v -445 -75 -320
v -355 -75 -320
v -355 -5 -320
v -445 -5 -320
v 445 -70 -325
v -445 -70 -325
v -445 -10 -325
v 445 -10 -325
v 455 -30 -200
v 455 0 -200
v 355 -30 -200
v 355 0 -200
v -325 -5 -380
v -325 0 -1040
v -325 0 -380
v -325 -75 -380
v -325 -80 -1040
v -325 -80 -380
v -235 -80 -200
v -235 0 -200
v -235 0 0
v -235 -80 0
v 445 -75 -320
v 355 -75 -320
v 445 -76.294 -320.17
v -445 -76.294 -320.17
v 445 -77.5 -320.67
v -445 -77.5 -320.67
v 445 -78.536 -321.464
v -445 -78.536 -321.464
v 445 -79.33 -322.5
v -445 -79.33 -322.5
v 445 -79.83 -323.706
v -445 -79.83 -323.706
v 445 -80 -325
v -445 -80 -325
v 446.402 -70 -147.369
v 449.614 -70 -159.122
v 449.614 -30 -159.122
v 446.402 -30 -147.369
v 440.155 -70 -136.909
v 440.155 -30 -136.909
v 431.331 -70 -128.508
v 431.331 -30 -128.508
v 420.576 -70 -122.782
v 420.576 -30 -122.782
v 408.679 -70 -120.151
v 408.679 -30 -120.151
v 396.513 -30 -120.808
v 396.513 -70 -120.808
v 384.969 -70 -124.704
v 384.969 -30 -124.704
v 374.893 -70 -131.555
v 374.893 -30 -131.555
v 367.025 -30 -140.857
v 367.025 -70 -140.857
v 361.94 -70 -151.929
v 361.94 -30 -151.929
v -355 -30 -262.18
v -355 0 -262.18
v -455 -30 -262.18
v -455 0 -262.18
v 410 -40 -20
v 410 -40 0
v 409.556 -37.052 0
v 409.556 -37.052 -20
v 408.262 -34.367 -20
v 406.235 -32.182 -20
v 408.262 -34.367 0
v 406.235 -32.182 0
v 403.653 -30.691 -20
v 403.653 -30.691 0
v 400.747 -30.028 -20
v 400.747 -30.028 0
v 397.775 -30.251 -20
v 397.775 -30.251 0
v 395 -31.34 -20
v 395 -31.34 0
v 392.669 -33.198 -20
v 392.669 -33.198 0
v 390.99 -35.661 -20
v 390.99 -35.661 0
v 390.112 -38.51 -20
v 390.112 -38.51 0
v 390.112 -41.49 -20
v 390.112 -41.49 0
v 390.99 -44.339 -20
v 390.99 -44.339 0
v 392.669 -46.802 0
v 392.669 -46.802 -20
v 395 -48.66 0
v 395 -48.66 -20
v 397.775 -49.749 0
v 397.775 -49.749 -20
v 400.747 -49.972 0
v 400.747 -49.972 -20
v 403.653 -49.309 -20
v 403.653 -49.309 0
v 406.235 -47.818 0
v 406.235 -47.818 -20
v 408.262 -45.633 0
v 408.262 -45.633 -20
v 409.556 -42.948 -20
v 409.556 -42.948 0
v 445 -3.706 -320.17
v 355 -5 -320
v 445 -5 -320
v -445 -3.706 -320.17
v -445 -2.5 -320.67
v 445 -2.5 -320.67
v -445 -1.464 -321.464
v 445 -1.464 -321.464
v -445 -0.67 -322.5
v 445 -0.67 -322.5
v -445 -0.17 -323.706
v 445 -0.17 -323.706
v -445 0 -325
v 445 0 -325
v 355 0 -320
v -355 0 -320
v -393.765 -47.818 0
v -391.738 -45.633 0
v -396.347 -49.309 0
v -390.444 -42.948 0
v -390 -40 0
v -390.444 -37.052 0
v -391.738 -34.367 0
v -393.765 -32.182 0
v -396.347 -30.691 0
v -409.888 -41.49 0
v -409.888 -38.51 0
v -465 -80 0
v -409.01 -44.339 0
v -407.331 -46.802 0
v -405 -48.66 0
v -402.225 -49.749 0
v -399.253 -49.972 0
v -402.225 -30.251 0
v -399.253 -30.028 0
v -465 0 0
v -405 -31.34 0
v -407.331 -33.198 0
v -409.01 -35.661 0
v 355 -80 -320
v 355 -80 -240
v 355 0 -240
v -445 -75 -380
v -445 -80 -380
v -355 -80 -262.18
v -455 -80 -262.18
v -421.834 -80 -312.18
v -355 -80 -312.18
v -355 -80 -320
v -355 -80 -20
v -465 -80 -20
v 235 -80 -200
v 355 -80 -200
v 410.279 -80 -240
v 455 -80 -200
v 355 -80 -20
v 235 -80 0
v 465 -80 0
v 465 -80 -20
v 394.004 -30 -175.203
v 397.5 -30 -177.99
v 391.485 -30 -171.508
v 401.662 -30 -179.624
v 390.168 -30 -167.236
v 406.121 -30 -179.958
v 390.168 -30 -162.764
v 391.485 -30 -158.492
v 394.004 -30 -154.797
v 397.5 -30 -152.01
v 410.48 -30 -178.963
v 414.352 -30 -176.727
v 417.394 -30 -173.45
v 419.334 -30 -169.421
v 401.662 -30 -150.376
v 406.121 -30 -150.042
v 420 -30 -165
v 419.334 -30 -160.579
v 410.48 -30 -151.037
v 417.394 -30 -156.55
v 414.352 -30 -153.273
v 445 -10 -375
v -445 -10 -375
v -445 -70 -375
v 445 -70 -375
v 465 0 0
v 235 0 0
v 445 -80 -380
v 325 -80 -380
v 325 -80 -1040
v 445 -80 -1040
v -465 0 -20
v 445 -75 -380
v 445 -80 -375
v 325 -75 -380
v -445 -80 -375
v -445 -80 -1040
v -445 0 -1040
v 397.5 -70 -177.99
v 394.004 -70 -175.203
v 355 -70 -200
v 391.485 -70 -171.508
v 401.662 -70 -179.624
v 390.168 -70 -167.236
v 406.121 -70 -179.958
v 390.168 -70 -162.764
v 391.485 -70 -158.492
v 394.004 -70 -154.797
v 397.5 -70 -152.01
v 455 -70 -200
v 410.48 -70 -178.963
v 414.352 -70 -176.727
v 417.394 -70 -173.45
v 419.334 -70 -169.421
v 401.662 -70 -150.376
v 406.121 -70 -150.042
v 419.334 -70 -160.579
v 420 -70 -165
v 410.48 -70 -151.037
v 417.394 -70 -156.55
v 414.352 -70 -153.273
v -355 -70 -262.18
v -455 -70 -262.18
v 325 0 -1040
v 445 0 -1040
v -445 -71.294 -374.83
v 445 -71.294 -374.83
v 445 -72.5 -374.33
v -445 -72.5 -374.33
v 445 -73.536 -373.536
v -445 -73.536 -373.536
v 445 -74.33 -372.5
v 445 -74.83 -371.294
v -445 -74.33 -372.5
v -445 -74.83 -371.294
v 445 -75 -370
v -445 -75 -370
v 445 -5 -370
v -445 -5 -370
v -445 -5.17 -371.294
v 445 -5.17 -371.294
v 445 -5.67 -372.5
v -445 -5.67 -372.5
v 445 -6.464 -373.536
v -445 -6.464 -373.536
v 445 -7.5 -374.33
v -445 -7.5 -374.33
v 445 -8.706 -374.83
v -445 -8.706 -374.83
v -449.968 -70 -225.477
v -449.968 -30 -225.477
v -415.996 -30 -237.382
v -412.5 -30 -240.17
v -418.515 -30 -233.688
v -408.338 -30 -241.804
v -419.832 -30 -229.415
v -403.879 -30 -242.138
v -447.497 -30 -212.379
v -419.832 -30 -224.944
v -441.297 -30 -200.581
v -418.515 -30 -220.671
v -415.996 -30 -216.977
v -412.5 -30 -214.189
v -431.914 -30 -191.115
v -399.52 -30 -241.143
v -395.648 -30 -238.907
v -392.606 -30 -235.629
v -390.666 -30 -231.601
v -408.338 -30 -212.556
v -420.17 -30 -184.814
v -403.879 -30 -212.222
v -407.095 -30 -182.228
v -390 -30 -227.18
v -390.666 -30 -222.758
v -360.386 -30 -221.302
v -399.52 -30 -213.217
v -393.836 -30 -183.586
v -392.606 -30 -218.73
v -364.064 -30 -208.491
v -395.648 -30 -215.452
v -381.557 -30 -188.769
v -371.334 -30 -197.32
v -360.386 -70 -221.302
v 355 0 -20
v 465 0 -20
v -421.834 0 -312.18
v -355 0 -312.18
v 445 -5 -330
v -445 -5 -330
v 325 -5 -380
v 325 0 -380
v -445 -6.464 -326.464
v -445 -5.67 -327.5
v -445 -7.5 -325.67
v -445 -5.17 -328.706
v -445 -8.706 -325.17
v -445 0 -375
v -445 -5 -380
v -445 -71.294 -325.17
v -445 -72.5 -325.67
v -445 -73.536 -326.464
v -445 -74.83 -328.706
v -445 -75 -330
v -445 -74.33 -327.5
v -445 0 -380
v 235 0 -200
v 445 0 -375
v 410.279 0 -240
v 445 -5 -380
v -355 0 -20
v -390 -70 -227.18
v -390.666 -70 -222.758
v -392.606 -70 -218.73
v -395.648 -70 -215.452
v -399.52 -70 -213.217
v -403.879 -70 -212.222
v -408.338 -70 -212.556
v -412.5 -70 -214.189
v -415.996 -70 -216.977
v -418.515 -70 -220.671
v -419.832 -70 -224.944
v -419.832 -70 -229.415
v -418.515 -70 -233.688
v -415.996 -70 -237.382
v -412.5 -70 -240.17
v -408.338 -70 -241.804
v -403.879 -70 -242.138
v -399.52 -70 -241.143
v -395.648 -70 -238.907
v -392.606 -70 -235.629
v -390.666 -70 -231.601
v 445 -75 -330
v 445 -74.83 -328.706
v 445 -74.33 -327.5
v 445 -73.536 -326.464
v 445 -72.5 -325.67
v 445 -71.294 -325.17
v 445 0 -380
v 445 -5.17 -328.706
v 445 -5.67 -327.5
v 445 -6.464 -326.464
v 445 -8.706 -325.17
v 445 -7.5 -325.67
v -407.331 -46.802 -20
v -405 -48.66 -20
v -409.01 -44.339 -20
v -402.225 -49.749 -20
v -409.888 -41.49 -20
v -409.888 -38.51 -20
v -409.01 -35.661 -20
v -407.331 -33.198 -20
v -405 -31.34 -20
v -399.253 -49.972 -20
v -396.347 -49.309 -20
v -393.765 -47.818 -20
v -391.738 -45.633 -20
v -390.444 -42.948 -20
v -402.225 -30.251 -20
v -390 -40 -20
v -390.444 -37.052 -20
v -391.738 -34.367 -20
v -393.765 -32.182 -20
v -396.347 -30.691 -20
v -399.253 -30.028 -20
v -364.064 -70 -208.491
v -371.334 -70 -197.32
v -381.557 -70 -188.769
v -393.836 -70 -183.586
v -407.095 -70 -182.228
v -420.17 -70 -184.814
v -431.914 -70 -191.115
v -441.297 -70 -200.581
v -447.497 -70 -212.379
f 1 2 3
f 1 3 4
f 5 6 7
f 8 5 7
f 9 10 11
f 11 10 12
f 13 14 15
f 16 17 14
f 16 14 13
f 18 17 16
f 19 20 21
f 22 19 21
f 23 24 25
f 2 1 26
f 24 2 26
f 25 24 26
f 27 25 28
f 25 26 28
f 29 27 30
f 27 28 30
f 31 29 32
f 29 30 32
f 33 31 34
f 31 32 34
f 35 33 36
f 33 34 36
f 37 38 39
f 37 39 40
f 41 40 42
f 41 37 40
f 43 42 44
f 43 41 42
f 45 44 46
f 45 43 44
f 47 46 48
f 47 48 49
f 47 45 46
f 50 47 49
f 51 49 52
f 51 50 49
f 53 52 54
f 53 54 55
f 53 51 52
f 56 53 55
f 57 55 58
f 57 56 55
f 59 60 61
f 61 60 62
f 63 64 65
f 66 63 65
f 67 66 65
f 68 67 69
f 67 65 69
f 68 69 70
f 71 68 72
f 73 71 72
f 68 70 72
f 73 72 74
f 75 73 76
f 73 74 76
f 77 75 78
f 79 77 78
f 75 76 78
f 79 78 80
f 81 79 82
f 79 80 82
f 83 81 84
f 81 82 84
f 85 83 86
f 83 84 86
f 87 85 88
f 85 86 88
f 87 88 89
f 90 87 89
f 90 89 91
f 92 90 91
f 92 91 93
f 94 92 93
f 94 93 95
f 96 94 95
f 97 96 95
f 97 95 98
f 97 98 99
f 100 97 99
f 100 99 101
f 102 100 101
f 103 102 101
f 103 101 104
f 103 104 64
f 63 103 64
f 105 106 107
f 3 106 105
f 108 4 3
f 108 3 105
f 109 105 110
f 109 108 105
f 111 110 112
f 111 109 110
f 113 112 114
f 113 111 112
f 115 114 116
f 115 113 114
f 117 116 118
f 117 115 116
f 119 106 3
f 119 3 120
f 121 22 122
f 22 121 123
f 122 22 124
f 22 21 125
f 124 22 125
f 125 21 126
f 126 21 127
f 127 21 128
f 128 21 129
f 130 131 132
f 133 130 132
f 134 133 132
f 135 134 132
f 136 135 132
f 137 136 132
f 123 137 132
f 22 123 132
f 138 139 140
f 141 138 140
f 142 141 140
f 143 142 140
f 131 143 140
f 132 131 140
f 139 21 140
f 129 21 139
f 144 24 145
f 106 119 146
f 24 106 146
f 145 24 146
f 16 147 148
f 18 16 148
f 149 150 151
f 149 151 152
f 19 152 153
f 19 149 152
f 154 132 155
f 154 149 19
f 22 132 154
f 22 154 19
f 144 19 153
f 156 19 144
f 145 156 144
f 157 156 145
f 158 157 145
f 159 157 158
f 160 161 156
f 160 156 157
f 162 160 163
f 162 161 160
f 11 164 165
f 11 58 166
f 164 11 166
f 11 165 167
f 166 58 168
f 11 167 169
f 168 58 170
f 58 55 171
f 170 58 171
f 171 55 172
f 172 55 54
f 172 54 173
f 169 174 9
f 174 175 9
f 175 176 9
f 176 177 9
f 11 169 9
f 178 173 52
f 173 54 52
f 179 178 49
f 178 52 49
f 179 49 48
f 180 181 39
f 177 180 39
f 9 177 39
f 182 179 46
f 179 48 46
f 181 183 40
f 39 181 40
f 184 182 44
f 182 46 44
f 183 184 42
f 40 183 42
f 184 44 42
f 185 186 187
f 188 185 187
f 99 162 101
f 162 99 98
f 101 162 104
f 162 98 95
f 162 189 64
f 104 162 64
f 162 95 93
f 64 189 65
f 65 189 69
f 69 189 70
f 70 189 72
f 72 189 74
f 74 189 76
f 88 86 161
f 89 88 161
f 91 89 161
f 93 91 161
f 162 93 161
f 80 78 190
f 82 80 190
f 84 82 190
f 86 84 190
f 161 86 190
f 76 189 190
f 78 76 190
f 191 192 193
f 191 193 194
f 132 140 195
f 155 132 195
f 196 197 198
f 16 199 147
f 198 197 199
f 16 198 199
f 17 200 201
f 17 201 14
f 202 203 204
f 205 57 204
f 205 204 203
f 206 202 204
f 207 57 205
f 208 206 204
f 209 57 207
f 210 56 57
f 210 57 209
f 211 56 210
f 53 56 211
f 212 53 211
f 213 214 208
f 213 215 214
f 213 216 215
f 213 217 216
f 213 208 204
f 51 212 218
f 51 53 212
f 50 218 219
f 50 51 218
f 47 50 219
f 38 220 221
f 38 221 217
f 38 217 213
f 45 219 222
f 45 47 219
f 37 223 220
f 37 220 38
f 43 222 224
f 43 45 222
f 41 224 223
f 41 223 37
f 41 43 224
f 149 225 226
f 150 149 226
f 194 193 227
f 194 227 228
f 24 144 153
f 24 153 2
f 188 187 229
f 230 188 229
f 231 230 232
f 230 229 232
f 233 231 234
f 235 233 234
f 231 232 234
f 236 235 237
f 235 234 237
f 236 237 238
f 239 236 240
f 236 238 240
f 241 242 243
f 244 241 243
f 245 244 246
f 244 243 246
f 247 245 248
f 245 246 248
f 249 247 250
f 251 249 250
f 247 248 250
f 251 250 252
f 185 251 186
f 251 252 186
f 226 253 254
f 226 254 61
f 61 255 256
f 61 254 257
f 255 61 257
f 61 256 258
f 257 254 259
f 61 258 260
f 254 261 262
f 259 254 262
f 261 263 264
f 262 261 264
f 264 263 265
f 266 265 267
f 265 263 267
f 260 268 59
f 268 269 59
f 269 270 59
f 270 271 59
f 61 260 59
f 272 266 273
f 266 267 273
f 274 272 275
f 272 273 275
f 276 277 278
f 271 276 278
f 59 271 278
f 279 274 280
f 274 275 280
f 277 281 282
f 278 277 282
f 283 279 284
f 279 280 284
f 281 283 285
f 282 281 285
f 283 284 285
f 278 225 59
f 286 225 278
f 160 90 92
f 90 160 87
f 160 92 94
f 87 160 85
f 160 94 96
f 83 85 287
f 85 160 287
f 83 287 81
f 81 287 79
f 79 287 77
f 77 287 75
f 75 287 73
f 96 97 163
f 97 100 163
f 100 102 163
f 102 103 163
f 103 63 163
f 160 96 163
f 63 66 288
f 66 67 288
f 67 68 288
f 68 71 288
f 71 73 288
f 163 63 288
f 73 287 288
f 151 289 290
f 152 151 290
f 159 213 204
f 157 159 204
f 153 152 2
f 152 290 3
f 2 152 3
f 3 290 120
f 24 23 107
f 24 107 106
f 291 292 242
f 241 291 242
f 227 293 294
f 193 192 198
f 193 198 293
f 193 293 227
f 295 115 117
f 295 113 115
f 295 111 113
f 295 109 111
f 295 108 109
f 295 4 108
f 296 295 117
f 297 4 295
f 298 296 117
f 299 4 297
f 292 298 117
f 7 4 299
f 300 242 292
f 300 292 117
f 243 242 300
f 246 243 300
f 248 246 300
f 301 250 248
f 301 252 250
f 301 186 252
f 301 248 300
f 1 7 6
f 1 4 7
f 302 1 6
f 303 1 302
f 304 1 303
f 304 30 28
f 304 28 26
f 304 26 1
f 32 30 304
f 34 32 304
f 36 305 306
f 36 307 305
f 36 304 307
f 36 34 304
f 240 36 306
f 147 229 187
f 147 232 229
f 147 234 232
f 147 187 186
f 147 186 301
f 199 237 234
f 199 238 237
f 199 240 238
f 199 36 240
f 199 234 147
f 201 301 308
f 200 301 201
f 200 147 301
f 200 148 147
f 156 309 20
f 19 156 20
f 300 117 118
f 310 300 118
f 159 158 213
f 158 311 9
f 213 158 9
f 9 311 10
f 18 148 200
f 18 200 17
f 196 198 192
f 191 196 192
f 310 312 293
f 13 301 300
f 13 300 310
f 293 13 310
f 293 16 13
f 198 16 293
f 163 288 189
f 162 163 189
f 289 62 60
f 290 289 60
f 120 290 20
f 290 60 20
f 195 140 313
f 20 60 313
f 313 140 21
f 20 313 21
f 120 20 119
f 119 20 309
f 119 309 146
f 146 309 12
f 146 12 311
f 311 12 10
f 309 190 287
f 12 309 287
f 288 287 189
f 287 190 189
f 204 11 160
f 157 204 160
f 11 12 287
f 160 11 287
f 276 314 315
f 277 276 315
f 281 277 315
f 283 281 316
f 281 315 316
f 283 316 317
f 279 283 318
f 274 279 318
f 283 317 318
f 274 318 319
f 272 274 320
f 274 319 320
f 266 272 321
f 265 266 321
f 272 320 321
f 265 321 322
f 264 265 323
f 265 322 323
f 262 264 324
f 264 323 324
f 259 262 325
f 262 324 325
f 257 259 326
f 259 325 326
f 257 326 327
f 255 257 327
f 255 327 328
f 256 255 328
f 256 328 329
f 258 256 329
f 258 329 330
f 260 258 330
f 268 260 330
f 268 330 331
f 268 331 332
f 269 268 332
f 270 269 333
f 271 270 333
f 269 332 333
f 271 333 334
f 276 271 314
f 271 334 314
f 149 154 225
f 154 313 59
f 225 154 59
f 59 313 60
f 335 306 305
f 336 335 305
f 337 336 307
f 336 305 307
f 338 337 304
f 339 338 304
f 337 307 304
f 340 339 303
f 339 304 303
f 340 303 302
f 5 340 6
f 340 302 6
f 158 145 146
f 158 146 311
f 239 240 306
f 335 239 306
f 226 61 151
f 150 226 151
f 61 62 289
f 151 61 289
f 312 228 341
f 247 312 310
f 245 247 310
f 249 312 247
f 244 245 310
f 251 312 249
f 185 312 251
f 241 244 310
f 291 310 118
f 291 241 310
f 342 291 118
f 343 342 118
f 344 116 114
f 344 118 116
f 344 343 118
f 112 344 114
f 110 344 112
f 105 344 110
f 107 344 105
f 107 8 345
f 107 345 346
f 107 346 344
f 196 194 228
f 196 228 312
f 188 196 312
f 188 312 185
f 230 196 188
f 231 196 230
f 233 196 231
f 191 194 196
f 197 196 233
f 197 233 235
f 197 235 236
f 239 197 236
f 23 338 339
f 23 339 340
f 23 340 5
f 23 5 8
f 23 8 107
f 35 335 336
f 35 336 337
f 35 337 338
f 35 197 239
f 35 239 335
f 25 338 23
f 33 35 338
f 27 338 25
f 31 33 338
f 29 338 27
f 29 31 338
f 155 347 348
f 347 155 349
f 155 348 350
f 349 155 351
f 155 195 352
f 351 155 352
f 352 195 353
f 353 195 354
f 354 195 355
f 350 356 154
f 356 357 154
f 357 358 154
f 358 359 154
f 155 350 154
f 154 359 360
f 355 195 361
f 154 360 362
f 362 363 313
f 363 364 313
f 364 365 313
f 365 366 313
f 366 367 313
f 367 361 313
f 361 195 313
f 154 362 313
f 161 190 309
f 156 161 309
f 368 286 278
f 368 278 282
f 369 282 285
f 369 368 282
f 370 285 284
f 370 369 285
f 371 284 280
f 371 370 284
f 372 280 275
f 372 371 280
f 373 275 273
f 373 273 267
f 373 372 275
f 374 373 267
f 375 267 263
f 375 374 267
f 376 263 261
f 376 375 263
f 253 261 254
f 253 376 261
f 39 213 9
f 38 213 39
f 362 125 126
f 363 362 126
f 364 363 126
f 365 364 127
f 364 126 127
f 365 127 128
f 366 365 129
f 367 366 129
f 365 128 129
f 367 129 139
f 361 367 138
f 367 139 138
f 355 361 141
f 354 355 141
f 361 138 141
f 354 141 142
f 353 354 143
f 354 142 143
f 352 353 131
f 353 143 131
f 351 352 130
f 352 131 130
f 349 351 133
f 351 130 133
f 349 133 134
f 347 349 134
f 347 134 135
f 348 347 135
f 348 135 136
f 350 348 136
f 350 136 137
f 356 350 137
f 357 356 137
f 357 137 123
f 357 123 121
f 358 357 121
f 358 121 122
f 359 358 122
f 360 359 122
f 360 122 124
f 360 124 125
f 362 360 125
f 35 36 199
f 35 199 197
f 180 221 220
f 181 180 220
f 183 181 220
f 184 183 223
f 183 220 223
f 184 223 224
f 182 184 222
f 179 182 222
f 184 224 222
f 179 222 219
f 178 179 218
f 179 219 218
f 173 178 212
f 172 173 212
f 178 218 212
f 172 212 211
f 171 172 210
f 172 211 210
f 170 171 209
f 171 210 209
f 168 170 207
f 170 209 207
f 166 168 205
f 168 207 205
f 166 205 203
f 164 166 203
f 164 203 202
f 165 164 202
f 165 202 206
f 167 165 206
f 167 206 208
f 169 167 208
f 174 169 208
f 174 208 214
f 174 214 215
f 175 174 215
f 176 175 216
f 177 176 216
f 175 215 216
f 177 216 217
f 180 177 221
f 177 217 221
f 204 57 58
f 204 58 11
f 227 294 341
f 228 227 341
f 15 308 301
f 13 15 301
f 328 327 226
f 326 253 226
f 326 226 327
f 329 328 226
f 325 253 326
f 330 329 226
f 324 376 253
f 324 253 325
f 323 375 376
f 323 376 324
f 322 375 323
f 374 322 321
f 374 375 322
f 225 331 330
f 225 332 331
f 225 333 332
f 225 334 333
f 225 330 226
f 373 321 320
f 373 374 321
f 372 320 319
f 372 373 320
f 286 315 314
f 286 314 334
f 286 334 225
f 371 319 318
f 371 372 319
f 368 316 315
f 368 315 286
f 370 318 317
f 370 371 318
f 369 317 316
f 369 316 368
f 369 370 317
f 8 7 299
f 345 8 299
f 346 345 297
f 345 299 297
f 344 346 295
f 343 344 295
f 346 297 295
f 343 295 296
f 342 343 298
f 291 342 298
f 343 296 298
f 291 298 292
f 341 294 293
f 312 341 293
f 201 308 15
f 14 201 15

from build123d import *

# Parameters (mm, degrees)
F0_W      = 470
F0_H      = 400
F0_W_2    = 60
F0_H_2    = 20
F1_DEPTH  = 80
F2_W      = 989.0920937061
F2_H      = 720
F3_DEPTH  = 80
F4_R      = 10
F5_DEPTH  = 25
F7_START  = -10
F6_R      = 15
F7_DEPTH  = 40
F10_DEPTH = 80
F12_DEPTH = 890
F13_R     = 5
F15_DEPTH = 1000
F17_DEPTH = 890


with BuildPart() as f1:
    # F0 (on Front) → F1 (new body)
    with BuildSketch(Plane.XZ):
        Polygon((-235, 0), (-355, 0), (-465, 0), (-465, -20), (-355, -20), (-355, -262.1796250343), (-455, -262.1796250343), (-421.8337520964, -312.1796250343), (-355, -312.1796250343), (-355, -1020), (-355, -1040), (-235, -1040), (-235, -840), (235, -840), (235, -1040), (355, -1040), (355, -1020), (355, -240), (410.27864045, -240), (455, -200), (355, -200), (355, -20), (465, -20), (465, 0), (355, 0), (235, 0), (235, -200), (-235, -200), align=None)
        with Locations((0, -520)):
            Rectangle(F0_W, F0_H, mode=Mode.SUBTRACT)
        with Locations((-385, -1030)):
            Rectangle(F0_W_2, F0_H_2)
        with Locations((385, -1030)):
            Rectangle(F0_W_2, F0_H_2)
    extrude(amount=F1_DEPTH)

    # F2 (on face) → F3 (cut)
    with BuildSketch(Plane.XZ.offset(80)):
        with Locations((42.8487956524, -680)):
            Rectangle(F2_W, F2_H)
    extrude(amount=-F3_DEPTH, mode=Mode.SUBTRACT)

    # F4 (on face) → F5 (cut)
    with BuildSketch(Plane.XY):
        with Locations((-400, -40)):
            Circle(F4_R)
        with Locations((400, -40)):
            Circle(F4_R)
    extrude(amount=-F5_DEPTH, mode=Mode.SUBTRACT)

    # F6 (on face) → F7 (join)
    with BuildSketch(Plane.XZ.offset(80).offset(F7_START)):
        with BuildLine():
            Line((-355, -262.1796250343), (-360.3855265494, -221.3018058192))
            ThreePointArc((-360.3855265494, -221.3018058192), (-407.0948116692, -182.2284096551), (-449.9677594515, -225.4765073318))
            Line((-449.9677594515, -225.4765073318), (-455, -262.1796250343))
            Line((-455, -262.1796250343), (-355, -262.1796250343))
        make_face()
        with Locations((-405, -227.1796250343)):
            Circle(F6_R, mode=Mode.SUBTRACT)
        with BuildLine():
            Line((355, -200), (455, -200))
            Line((455, -200), (449.6144734506, -159.1221807849))
            ThreePointArc((449.6144734506, -159.1221807849), (408.6794577223, -120.1506790367), (361.9400684353, -151.9293346135))
            Line((361.9400684353, -151.9293346135), (355, -200))
        make_face()
        with Locations((405, -165)):
            Circle(F6_R, mode=Mode.SUBTRACT)
    extrude(amount=-F7_DEPTH)

    # F9 (on face) → F10 (join)
    with BuildSketch(Plane.XZ.offset(80)):
        Polygon((445, -320), (-445, -320), (-445, -380), (-445, -1040), (-325, -1040), (-325, -380), (325, -380), (325, -1040), (445, -1040), (445, -380), align=None)
    extrude(amount=-F10_DEPTH)

    # F11 (on face) → F12 (cut)
    with BuildSketch(Plane(origin=(-445, 0, 0), x_dir=(0, -1, 0), z_dir=(-1, 0, 0))):
        with BuildLine():
            Line((70, -325), (10, -325))
            ThreePointArc((10, -325), (6.4644660941, -326.4644660941), (5, -330))
            Line((5, -330), (5, -370))
            ThreePointArc((5, -370), (6.4644660941, -373.5355339059), (10, -375))
            Line((10, -375), (70, -375))
            ThreePointArc((70, -375), (73.5355339059, -373.5355339059), (75, -370))
            Line((75, -370), (75, -330))
            ThreePointArc((75, -330), (73.5355339059, -326.4644660941), (70, -325))
        make_face()
    extrude(amount=-F12_DEPTH, mode=Mode.SUBTRACT)

    # F13
    f13_edges = [f1.edges().sort_by_distance(p)[0] for p in [
        (-400, -80, -320),
        (-400, 0, -320),
        (0, -80, -380),
        (0, 0, -380),
        (400, -80, -320),
        (400, 0, -320),
    ]]
    fillet(f13_edges, radius=F13_R)

    # F14 (on face) → F15 (cut)
    with BuildSketch(Plane(origin=(-445, 0, 0), x_dir=(0, -1, 0), z_dir=(-1, 0, 0))):
        Polygon((75, -380), (80, -380), (80, -375), align=None)
        Polygon((0, -375), (0, -380), (5, -380), align=None)
    extrude(amount=-F15_DEPTH, mode=Mode.SUBTRACT)

    # F16 (on face) → F17 (cut)
    with BuildSketch(Plane(origin=(-445, 0, 0), x_dir=(0, -1, 0), z_dir=(-1, 0, 0))):
        with BuildLine():
            ThreePointArc((75, -320), (78.5355339059, -321.4644660941), (80, -325))
            Line((80, -325), (80, -320))
            Line((80, -320), (75, -320))
        make_face()
        with BuildLine():
            ThreePointArc((0, -325), (1.4644660941, -321.4644660941), (5, -320))
            Line((5, -320), (0, -320))
            Line((0, -320), (0, -325))
        make_face()
    extrude(amount=-F17_DEPTH, mode=Mode.SUBTRACT)


solid = f1.part
